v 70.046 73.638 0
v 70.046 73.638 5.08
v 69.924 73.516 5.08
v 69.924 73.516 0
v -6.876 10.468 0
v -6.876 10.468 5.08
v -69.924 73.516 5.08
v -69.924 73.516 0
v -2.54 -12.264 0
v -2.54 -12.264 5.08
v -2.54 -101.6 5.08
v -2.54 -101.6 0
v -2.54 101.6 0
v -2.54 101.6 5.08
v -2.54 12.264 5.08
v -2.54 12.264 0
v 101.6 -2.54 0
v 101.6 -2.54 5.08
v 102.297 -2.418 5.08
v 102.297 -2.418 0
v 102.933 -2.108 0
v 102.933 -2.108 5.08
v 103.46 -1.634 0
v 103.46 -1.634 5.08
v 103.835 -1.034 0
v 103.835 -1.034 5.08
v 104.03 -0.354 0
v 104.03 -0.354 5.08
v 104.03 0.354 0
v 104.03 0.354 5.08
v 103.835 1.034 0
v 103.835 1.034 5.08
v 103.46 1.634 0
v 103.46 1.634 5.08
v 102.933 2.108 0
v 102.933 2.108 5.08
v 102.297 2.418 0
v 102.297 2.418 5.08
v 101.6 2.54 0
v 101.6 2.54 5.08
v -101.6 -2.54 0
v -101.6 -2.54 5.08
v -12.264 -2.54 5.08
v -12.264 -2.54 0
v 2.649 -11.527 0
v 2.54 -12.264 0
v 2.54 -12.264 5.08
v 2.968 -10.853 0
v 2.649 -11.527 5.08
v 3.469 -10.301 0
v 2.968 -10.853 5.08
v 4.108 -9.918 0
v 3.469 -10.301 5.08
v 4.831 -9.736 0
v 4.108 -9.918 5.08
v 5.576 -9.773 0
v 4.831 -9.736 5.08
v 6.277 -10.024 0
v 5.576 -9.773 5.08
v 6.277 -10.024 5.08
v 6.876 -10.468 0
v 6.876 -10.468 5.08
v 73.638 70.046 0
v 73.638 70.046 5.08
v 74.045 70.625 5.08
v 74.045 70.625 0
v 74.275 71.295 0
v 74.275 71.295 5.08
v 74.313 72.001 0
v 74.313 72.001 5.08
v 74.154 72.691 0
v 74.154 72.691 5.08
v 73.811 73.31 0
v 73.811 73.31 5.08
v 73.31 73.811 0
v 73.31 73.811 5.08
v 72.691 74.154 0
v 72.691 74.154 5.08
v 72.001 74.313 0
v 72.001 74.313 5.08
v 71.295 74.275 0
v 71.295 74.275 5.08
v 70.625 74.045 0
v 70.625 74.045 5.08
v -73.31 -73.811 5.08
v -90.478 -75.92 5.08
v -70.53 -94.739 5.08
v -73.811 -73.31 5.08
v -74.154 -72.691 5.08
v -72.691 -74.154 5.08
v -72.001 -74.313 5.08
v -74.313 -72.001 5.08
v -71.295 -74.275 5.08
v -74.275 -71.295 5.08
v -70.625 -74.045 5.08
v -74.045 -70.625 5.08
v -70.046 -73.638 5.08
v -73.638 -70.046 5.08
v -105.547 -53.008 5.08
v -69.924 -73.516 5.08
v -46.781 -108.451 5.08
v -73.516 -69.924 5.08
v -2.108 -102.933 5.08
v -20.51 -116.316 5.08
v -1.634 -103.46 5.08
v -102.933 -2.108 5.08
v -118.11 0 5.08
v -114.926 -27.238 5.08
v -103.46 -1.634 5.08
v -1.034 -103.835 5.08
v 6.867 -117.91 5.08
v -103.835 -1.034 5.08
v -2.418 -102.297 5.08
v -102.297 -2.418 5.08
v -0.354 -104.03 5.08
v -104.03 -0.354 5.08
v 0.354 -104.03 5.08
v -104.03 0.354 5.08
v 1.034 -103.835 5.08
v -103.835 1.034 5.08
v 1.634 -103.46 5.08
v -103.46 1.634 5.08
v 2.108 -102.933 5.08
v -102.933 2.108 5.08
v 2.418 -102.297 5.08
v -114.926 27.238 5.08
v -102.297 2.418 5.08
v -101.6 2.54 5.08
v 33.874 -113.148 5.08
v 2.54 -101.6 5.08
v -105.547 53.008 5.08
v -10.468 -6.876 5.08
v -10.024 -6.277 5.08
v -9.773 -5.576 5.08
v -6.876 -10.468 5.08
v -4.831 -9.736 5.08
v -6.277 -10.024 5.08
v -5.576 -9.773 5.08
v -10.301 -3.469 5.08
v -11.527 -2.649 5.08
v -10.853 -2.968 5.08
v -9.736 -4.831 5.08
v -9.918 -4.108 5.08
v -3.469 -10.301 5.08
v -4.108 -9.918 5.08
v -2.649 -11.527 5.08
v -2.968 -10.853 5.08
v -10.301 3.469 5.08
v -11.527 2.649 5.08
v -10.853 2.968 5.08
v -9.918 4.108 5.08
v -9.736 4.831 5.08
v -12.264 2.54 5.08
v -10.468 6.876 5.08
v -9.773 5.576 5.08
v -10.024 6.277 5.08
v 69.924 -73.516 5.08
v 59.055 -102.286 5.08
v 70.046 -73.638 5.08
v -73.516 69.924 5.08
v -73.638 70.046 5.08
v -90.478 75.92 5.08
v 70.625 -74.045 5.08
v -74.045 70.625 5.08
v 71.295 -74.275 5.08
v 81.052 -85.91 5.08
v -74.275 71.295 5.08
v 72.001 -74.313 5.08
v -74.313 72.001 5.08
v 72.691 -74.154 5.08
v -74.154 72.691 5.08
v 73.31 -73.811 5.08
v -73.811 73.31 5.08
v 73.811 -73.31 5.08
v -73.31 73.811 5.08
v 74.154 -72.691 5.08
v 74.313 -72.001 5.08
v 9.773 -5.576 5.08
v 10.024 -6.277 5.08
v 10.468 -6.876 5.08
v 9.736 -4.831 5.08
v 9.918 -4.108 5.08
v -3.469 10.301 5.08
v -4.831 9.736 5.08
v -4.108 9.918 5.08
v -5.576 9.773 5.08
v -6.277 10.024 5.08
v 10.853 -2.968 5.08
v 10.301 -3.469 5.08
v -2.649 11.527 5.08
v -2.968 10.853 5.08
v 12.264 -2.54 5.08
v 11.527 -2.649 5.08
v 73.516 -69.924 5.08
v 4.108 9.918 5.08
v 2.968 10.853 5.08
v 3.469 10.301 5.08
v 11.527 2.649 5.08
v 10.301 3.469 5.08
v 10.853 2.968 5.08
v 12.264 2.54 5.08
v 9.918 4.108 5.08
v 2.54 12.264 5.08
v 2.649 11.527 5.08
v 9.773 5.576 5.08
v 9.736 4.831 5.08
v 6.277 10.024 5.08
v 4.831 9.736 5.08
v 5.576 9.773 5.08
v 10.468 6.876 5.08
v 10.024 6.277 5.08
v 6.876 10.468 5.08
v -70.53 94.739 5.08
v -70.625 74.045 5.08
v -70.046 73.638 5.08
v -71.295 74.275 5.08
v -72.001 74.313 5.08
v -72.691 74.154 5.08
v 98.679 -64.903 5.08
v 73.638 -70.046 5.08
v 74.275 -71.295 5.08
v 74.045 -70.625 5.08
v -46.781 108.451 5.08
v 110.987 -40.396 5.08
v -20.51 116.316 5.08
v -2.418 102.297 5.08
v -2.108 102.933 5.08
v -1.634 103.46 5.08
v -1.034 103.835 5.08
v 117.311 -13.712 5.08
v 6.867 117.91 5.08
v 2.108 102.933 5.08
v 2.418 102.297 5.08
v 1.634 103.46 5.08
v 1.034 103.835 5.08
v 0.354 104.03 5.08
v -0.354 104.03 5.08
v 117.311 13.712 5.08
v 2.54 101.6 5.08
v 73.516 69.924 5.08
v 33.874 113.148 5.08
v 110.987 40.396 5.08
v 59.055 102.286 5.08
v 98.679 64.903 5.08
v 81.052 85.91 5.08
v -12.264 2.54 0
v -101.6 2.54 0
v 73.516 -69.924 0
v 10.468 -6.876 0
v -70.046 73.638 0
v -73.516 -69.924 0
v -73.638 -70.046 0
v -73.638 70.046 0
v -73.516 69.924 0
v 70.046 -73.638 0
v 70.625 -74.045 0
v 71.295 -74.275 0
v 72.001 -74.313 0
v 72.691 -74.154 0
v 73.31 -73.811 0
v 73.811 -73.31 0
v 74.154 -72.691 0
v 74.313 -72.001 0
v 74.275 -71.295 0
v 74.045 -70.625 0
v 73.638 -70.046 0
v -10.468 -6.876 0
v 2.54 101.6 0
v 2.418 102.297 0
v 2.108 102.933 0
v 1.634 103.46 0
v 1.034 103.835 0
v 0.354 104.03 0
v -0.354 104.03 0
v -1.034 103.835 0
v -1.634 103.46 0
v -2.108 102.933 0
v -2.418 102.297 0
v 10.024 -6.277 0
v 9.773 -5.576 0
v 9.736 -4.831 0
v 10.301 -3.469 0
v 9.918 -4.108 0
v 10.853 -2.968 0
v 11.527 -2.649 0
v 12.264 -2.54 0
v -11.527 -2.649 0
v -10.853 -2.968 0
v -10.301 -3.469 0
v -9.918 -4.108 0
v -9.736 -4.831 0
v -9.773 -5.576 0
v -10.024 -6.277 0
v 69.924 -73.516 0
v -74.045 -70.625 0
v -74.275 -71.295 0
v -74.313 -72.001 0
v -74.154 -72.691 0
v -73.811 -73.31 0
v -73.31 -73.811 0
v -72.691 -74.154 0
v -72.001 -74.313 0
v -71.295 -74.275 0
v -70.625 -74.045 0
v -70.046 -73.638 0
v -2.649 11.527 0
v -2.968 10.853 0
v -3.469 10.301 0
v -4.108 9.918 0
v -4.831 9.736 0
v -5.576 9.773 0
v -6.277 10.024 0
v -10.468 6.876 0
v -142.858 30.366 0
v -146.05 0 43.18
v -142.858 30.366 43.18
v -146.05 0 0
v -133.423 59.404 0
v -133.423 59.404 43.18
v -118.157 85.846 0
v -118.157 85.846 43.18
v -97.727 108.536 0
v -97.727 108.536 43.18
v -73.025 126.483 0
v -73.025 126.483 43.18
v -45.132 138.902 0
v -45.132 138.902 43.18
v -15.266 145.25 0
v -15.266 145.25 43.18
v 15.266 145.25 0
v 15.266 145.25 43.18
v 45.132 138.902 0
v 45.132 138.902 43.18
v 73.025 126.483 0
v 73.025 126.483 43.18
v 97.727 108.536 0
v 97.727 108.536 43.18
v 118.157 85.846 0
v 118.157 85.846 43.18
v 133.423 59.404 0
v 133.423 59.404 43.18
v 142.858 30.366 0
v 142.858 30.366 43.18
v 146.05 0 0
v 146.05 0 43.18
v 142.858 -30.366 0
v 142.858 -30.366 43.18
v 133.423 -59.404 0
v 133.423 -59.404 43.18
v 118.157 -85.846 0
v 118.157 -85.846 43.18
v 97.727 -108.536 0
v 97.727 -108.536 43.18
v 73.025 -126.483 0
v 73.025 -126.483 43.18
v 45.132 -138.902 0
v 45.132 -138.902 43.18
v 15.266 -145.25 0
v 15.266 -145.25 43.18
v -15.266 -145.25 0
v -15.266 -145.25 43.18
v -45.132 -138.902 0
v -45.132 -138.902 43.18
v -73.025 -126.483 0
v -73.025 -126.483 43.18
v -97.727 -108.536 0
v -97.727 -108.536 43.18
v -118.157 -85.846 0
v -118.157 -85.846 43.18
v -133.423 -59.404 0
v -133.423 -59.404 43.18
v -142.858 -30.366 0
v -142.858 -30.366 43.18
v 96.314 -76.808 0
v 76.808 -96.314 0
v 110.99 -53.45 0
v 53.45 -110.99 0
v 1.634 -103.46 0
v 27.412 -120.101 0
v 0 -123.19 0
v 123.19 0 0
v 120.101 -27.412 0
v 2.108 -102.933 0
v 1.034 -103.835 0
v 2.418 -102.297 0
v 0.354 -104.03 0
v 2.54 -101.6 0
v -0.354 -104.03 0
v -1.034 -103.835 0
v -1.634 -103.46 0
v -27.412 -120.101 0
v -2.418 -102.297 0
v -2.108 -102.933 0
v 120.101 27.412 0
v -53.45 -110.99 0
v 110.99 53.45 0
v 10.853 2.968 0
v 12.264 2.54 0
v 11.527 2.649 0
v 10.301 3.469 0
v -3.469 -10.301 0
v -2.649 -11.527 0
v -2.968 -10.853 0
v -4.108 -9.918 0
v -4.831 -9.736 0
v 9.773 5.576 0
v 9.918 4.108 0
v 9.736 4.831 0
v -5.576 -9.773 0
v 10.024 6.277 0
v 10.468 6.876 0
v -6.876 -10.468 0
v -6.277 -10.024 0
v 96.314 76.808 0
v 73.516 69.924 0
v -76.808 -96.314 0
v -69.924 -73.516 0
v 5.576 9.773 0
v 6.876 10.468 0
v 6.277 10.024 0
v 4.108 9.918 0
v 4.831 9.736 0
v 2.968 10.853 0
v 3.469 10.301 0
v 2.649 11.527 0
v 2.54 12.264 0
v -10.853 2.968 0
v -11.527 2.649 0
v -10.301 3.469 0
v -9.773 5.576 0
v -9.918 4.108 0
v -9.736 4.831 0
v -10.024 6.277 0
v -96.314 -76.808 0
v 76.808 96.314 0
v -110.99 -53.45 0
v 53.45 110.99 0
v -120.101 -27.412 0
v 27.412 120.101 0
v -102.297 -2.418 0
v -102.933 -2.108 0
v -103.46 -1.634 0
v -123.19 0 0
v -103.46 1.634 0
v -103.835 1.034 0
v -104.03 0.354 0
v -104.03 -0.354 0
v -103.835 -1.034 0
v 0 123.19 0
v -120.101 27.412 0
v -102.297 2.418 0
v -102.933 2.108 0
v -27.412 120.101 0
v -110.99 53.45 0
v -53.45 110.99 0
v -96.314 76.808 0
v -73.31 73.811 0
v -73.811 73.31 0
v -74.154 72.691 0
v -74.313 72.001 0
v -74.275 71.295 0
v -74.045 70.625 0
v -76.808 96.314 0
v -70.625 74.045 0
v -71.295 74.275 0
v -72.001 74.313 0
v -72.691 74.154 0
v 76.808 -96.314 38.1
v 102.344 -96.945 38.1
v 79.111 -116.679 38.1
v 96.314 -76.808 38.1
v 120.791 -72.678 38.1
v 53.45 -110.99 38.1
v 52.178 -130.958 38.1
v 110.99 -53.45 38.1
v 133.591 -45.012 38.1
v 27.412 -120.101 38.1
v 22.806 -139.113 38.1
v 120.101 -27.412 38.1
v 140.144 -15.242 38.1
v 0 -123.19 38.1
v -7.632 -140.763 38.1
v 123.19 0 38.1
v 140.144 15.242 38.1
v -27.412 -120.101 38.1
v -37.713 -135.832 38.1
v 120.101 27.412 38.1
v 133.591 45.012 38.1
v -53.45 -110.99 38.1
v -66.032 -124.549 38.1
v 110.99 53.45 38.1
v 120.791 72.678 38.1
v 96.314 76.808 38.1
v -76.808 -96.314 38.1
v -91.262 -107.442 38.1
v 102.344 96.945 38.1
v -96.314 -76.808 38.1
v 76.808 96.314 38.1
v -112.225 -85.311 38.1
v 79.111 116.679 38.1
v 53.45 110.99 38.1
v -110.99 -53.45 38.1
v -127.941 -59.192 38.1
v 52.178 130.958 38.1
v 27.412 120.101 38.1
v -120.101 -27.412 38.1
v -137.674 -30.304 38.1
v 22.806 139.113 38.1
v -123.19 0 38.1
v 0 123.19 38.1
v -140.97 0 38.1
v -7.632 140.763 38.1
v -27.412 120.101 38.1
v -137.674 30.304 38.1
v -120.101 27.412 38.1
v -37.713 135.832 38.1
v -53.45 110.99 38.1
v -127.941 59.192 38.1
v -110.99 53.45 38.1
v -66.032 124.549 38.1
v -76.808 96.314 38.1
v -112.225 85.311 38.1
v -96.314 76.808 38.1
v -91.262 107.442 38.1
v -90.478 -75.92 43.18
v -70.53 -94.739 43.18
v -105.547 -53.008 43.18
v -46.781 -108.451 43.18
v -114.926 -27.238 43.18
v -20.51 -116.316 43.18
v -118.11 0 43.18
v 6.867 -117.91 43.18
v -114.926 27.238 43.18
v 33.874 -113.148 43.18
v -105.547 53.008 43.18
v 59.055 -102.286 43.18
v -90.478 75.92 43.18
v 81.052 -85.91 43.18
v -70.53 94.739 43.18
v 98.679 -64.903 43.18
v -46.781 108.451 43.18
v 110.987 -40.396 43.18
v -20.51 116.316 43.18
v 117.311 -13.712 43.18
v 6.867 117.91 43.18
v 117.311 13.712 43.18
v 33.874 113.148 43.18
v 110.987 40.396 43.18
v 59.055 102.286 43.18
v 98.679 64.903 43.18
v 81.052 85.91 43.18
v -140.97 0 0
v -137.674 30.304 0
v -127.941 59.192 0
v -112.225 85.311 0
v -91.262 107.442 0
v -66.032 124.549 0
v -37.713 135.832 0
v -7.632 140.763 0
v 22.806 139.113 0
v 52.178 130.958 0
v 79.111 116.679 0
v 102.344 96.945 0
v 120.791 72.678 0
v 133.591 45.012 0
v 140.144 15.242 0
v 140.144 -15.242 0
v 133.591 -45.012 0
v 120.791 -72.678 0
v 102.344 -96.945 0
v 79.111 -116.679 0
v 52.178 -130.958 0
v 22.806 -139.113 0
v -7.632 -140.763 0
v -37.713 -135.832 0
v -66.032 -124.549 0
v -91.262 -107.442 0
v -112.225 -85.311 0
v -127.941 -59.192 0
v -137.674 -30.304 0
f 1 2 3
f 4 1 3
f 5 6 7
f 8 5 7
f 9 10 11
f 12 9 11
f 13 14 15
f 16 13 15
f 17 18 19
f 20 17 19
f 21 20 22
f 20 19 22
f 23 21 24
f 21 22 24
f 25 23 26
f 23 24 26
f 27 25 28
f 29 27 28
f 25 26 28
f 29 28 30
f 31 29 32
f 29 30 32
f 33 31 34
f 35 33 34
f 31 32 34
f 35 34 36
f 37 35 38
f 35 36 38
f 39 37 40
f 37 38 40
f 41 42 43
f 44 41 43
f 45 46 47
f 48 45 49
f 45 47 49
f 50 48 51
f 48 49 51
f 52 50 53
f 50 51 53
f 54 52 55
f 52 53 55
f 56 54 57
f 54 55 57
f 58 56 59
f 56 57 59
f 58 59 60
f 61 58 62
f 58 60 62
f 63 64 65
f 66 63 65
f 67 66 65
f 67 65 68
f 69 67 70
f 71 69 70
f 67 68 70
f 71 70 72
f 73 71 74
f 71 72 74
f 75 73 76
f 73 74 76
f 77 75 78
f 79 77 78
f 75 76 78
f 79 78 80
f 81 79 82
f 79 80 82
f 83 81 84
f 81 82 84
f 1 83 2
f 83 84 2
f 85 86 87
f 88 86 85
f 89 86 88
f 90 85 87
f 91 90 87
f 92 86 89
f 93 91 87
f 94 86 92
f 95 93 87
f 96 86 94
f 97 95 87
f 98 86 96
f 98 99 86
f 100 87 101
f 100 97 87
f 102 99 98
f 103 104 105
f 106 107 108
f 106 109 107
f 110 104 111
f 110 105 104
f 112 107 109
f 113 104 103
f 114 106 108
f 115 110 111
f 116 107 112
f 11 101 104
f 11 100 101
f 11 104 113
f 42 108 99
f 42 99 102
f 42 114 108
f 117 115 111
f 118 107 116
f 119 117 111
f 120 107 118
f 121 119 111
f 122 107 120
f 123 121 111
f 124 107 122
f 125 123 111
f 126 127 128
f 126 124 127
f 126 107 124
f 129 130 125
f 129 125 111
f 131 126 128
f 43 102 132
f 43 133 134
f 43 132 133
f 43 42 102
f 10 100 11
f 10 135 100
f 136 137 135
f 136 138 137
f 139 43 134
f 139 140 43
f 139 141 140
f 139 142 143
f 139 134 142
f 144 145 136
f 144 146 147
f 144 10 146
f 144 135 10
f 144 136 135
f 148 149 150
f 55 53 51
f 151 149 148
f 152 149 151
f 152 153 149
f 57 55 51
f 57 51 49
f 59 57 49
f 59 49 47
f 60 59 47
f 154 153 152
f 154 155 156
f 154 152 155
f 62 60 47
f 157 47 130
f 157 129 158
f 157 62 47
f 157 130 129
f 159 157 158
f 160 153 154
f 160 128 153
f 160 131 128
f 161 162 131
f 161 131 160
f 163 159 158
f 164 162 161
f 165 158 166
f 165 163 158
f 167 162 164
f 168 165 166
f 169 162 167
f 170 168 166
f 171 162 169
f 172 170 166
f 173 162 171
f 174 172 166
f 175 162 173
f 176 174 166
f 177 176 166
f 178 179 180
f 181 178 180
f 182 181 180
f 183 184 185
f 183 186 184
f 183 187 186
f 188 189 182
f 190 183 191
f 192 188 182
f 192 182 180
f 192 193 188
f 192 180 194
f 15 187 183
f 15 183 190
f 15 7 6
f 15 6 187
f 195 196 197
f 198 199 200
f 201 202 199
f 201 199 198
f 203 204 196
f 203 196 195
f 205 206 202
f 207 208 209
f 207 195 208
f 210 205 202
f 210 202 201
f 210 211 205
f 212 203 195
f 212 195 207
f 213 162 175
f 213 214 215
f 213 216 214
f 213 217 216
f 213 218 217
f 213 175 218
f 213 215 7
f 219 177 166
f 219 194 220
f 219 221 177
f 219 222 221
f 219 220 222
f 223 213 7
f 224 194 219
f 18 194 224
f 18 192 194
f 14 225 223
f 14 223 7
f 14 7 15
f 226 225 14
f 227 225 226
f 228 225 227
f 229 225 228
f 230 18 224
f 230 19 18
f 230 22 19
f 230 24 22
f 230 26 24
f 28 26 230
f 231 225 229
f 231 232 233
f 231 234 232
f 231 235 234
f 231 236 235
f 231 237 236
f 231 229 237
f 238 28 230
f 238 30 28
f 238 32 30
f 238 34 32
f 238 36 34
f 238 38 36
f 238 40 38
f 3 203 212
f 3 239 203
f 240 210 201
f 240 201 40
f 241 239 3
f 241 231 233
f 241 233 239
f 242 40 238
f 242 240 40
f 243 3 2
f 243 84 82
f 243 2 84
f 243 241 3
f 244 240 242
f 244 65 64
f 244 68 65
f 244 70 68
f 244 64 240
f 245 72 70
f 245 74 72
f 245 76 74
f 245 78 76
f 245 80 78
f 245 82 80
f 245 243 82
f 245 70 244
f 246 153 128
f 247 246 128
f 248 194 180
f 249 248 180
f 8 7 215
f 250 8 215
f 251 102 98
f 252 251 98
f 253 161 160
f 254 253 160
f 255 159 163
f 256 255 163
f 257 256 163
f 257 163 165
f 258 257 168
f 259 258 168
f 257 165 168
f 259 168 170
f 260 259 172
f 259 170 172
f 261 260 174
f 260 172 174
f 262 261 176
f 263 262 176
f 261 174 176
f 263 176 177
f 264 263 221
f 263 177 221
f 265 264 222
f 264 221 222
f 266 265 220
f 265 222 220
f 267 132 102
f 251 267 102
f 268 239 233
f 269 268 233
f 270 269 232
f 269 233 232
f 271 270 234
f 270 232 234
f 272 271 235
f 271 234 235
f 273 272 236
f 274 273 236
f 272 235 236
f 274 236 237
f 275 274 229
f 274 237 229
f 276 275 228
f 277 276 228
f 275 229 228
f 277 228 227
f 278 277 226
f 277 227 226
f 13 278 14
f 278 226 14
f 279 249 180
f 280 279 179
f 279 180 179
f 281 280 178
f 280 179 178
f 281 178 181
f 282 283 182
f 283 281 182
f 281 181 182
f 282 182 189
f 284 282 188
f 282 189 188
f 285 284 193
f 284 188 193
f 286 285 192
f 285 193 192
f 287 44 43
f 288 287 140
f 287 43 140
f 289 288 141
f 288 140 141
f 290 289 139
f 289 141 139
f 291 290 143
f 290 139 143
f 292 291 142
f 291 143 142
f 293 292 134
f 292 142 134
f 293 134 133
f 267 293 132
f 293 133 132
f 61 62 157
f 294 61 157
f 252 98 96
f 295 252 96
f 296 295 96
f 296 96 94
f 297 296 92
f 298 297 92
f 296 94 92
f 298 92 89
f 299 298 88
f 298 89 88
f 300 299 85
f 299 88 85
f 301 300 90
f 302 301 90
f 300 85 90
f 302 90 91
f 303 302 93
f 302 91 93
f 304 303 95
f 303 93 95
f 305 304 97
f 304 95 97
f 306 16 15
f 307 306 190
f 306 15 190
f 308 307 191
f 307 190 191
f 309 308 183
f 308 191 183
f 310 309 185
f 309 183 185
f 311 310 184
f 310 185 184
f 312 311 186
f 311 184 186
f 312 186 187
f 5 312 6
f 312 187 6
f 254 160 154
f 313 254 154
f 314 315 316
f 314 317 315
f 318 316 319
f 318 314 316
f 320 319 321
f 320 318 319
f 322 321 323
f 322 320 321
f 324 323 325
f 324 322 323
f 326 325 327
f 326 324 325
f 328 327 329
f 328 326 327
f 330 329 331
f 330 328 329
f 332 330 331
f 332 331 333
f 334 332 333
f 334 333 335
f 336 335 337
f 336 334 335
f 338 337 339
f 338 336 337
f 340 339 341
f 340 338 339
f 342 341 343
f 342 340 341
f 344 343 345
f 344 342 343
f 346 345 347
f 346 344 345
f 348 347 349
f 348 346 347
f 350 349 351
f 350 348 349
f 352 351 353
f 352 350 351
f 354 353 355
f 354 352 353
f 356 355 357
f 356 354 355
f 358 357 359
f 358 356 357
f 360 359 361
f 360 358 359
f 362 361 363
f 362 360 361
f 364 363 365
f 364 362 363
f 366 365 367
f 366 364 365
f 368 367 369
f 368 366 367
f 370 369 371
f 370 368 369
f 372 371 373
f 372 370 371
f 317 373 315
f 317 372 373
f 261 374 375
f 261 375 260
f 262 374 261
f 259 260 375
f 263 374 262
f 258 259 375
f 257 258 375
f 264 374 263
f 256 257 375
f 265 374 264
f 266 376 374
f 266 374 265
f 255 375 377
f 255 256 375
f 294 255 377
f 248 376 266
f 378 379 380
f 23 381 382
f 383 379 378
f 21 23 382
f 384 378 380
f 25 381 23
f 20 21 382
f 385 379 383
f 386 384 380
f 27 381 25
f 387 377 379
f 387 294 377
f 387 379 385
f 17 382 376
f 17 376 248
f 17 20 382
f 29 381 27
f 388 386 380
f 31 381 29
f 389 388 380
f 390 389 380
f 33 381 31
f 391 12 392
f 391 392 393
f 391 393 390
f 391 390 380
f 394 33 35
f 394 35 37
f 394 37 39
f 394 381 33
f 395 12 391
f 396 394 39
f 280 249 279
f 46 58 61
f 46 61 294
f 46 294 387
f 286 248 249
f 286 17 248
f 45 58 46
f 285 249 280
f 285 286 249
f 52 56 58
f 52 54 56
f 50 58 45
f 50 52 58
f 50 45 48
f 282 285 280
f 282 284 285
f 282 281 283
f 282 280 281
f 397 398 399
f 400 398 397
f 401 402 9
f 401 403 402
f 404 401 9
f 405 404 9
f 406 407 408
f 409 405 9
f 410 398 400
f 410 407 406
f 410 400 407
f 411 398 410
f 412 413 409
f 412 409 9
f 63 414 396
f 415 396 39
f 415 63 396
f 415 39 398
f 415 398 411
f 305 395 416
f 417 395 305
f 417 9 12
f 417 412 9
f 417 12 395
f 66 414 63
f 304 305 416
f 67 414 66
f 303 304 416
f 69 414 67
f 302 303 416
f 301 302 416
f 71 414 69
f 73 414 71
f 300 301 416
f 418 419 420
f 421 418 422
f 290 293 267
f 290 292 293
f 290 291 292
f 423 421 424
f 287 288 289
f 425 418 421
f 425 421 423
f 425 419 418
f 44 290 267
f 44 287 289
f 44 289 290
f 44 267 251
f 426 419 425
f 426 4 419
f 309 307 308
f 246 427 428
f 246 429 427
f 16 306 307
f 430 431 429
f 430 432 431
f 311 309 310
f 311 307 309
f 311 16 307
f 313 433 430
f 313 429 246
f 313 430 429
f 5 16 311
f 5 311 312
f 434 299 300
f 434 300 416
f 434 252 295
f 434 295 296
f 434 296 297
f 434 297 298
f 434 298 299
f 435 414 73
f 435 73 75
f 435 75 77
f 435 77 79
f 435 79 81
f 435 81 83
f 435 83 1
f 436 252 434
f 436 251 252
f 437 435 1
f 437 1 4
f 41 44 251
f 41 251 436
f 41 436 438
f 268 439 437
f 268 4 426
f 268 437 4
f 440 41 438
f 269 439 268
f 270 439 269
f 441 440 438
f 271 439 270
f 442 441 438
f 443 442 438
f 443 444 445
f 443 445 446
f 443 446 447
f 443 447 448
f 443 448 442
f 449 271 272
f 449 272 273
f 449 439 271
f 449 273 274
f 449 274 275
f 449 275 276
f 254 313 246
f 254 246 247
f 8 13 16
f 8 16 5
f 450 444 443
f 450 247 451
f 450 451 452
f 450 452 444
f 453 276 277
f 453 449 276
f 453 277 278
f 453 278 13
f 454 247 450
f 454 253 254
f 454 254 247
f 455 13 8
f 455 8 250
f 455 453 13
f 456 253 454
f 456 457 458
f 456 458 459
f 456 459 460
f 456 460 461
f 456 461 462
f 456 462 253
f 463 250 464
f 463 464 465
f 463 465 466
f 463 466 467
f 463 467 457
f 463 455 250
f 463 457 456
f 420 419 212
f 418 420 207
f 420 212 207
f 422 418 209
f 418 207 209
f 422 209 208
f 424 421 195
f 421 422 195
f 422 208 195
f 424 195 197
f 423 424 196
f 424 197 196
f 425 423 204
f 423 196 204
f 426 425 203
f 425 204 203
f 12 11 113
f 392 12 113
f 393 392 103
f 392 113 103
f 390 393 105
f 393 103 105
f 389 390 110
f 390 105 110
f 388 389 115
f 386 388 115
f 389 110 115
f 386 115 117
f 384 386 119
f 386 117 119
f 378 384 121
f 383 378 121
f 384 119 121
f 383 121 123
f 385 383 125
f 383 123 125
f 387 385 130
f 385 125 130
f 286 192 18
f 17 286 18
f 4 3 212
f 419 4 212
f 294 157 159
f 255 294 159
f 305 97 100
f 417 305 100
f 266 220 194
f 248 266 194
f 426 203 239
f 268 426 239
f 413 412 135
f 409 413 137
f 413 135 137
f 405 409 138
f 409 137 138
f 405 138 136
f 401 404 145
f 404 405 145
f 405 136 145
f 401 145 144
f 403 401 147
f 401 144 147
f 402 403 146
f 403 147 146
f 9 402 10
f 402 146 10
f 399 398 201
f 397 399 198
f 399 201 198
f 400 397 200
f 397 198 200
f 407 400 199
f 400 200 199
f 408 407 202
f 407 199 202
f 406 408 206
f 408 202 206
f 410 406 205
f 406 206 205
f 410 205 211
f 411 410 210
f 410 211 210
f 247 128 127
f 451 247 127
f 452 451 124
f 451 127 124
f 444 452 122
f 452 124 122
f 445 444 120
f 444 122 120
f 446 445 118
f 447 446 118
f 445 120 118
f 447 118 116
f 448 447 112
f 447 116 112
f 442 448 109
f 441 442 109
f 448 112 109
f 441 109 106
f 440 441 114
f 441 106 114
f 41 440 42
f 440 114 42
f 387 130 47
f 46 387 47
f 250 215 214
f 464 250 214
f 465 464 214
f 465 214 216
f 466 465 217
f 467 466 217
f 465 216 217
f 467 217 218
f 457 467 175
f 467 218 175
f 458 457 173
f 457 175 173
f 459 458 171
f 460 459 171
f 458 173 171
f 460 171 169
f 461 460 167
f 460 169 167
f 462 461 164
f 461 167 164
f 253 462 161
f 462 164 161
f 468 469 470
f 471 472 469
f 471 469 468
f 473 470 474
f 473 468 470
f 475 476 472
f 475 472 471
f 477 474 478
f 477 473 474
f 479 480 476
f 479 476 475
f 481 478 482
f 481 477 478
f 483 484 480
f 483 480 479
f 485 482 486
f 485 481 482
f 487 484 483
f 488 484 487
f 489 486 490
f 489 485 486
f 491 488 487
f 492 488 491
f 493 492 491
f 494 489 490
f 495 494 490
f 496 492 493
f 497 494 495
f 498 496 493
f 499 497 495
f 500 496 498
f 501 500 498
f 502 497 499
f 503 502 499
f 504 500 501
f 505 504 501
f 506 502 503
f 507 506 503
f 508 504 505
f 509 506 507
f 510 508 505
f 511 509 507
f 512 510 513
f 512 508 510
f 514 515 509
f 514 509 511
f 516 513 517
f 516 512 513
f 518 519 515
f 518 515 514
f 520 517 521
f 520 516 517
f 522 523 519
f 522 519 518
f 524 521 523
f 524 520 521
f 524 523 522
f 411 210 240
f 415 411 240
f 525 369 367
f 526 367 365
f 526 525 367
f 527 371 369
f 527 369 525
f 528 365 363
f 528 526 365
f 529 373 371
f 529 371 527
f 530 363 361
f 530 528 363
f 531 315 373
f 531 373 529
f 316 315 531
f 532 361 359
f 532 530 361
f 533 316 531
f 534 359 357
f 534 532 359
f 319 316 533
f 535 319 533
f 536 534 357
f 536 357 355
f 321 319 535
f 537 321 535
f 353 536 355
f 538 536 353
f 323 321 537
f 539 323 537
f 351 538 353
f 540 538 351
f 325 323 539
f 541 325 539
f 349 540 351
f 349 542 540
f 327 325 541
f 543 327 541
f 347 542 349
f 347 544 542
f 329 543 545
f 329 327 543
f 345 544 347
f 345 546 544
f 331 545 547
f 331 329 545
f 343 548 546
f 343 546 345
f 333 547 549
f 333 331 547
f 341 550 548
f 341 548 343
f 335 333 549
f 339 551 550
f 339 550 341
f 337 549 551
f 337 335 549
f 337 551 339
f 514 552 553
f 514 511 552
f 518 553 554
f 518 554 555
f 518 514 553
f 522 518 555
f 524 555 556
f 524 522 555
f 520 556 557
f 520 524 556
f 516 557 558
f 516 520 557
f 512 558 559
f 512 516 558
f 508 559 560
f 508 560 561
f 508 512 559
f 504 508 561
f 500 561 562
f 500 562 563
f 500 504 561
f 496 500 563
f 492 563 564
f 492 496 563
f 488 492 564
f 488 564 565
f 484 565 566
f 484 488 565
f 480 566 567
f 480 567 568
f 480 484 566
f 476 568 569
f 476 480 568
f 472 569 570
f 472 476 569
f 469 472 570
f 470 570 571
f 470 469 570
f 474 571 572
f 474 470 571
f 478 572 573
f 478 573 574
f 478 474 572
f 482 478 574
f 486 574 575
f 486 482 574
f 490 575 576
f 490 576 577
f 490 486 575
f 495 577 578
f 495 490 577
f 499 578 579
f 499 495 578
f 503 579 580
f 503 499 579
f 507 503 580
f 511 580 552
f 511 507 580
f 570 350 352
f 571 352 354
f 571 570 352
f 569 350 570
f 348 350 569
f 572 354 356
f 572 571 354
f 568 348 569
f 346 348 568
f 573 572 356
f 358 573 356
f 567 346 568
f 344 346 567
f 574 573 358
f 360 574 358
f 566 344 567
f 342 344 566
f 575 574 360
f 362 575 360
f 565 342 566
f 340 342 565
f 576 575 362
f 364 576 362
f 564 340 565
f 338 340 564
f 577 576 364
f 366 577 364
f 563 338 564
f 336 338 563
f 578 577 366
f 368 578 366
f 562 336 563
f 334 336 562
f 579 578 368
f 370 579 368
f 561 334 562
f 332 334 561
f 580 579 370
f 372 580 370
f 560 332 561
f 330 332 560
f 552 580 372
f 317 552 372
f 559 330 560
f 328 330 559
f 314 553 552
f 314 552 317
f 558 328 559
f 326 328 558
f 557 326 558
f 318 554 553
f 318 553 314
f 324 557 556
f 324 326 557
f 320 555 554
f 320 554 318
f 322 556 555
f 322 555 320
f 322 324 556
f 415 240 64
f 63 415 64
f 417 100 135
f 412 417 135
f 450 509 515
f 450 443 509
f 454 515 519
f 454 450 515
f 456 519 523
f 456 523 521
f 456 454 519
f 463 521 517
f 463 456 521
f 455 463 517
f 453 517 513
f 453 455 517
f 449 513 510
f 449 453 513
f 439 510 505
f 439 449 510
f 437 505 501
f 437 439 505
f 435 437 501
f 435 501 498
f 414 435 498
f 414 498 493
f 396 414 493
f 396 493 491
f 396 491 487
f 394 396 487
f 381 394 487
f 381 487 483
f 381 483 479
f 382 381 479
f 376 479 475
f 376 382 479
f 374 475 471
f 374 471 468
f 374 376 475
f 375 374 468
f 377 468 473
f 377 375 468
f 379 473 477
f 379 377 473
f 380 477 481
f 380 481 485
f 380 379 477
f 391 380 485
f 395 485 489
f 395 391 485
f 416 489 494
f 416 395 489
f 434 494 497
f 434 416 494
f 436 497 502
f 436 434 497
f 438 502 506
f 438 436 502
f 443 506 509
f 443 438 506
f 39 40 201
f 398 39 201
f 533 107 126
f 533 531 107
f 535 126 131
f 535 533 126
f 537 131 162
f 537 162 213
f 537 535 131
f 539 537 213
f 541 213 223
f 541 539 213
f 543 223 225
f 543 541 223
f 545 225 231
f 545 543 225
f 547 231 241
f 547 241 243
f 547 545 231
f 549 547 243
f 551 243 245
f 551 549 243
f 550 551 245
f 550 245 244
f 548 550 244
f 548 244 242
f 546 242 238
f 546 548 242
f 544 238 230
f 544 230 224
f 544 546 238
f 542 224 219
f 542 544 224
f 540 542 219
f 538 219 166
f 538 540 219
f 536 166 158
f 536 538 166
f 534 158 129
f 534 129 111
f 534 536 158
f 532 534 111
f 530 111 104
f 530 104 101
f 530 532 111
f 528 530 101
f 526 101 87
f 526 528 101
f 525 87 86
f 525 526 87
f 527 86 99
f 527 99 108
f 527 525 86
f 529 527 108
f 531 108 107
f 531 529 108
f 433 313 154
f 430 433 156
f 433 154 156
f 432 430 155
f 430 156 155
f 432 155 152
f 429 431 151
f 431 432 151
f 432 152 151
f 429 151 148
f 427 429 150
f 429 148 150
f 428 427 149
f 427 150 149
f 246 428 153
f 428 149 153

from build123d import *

# Parameters (mm, degrees)
F3_DEPTH = 25.4


with BuildPart() as f1:
    # F0 (on Front) → F1 (revolve)
    with BuildSketch(Plane.XZ):
        Polygon((-123.19, 0), (0, 0), (0, 5.08), (-118.11, 5.08), (-118.11, 43.18), (-146.05, 43.18), (-146.05, 0), (-140.97, 0), (-140.97, 38.1), (-123.19, 38.1), align=None)
    revolve(axis=Axis((0, 0, 2.54), (0, 0, -1)))

    # F2 (on face) → F3 (cut)
    with BuildSketch(Plane.XY.offset(5.08)):
        with BuildLine():
            Line((2.54, 12.264205), (2.54, 101.426891))
            Line((2.54, 101.426891), (2.54, 101.6))
            ThreePointArc((2.54, 101.6), (0, 104.05492), (-2.54, 101.6))
            Line((-2.54, 101.6), (-2.54, 101.426891))
            Line((-2.54, 101.426891), (-2.54, 12.264205))
            ThreePointArc((-2.54, 12.264205), (-4.107984, 9.917551), (-6.876051, 10.468154))
            Line((-6.876051, 10.468154), (-69.923591, 73.515693))
            Line((-69.923591, 73.515693), (-70.045998, 73.6381))
            ThreePointArc((-70.045998, 73.6381), (-73.577939, 73.577939), (-73.6381, 70.045998))
            Line((-73.6381, 70.045998), (-73.515693, 69.923591))
            Line((-73.515693, 69.923591), (-10.468154, 6.876051))
            ThreePointArc((-10.468154, 6.876051), (-9.917551, 4.107984), (-12.264205, 2.54))
            Line((-12.264205, 2.54), (-101.426891, 2.54))
            Line((-101.426891, 2.54), (-101.6, 2.54))
            ThreePointArc((-101.6, 2.54), (-104.05492, 0), (-101.6, -2.54))
            Line((-101.6, -2.54), (-101.426891, -2.54))
            Line((-101.426891, -2.54), (-12.264205, -2.54))
            ThreePointArc((-12.264205, -2.54), (-9.917551, -4.107984), (-10.468154, -6.876051))
            Line((-10.468154, -6.876051), (-73.515693, -69.923591))
            Line((-73.515693, -69.923591), (-73.6381, -70.045998))
            ThreePointArc((-73.6381, -70.045998), (-73.577939, -73.577939), (-70.045998, -73.6381))
            Line((-70.045998, -73.6381), (-69.923591, -73.515693))
            Line((-69.923591, -73.515693), (-6.876051, -10.468154))
            ThreePointArc((-6.876051, -10.468154), (-4.107984, -9.917551), (-2.54, -12.264205))
            Line((-2.54, -12.264205), (-2.54, -101.426891))
            Line((-2.54, -101.426891), (-2.54, -101.6))
            ThreePointArc((-2.54, -101.6), (0, -104.05492), (2.54, -101.6))
            Line((2.54, -101.6), (2.54, -101.426891))
            Line((2.54, -101.426891), (2.54, -12.264205))
            ThreePointArc((2.54, -12.264205), (4.107984, -9.917551), (6.876051, -10.468154))
            Line((6.876051, -10.468154), (69.923591, -73.515693))
            Line((69.923591, -73.515693), (70.045998, -73.6381))
            ThreePointArc((70.045998, -73.6381), (73.577939, -73.577939), (73.6381, -70.045998))
            Line((73.6381, -70.045998), (73.515693, -69.923591))
            Line((73.515693, -69.923591), (10.468154, -6.876051))
            ThreePointArc((10.468154, -6.876051), (9.917551, -4.107984), (12.264205, -2.54))
            Line((12.264205, -2.54), (101.426891, -2.54))
            Line((101.426891, -2.54), (101.6, -2.54))
            ThreePointArc((101.6, -2.54), (104.05492, 0), (101.6, 2.54))
            Line((101.6, 2.54), (101.426891, 2.54))
            Line((101.426891, 2.54), (12.264205, 2.54))
            ThreePointArc((12.264205, 2.54), (9.917551, 4.107984), (10.468154, 6.876051))
            Line((10.468154, 6.876051), (73.515693, 69.923591))
            Line((73.515693, 69.923591), (73.6381, 70.045998))
            ThreePointArc((73.6381, 70.045998), (73.577939, 73.577939), (70.045998, 73.6381))
            Line((70.045998, 73.6381), (69.923591, 73.515693))
            Line((69.923591, 73.515693), (6.876051, 10.468154))
            ThreePointArc((6.876051, 10.468154), (4.107984, 9.917551), (2.54, 12.264205))
        make_face()
    extrude(amount=-F3_DEPTH, mode=Mode.SUBTRACT)


solid = f1.part
